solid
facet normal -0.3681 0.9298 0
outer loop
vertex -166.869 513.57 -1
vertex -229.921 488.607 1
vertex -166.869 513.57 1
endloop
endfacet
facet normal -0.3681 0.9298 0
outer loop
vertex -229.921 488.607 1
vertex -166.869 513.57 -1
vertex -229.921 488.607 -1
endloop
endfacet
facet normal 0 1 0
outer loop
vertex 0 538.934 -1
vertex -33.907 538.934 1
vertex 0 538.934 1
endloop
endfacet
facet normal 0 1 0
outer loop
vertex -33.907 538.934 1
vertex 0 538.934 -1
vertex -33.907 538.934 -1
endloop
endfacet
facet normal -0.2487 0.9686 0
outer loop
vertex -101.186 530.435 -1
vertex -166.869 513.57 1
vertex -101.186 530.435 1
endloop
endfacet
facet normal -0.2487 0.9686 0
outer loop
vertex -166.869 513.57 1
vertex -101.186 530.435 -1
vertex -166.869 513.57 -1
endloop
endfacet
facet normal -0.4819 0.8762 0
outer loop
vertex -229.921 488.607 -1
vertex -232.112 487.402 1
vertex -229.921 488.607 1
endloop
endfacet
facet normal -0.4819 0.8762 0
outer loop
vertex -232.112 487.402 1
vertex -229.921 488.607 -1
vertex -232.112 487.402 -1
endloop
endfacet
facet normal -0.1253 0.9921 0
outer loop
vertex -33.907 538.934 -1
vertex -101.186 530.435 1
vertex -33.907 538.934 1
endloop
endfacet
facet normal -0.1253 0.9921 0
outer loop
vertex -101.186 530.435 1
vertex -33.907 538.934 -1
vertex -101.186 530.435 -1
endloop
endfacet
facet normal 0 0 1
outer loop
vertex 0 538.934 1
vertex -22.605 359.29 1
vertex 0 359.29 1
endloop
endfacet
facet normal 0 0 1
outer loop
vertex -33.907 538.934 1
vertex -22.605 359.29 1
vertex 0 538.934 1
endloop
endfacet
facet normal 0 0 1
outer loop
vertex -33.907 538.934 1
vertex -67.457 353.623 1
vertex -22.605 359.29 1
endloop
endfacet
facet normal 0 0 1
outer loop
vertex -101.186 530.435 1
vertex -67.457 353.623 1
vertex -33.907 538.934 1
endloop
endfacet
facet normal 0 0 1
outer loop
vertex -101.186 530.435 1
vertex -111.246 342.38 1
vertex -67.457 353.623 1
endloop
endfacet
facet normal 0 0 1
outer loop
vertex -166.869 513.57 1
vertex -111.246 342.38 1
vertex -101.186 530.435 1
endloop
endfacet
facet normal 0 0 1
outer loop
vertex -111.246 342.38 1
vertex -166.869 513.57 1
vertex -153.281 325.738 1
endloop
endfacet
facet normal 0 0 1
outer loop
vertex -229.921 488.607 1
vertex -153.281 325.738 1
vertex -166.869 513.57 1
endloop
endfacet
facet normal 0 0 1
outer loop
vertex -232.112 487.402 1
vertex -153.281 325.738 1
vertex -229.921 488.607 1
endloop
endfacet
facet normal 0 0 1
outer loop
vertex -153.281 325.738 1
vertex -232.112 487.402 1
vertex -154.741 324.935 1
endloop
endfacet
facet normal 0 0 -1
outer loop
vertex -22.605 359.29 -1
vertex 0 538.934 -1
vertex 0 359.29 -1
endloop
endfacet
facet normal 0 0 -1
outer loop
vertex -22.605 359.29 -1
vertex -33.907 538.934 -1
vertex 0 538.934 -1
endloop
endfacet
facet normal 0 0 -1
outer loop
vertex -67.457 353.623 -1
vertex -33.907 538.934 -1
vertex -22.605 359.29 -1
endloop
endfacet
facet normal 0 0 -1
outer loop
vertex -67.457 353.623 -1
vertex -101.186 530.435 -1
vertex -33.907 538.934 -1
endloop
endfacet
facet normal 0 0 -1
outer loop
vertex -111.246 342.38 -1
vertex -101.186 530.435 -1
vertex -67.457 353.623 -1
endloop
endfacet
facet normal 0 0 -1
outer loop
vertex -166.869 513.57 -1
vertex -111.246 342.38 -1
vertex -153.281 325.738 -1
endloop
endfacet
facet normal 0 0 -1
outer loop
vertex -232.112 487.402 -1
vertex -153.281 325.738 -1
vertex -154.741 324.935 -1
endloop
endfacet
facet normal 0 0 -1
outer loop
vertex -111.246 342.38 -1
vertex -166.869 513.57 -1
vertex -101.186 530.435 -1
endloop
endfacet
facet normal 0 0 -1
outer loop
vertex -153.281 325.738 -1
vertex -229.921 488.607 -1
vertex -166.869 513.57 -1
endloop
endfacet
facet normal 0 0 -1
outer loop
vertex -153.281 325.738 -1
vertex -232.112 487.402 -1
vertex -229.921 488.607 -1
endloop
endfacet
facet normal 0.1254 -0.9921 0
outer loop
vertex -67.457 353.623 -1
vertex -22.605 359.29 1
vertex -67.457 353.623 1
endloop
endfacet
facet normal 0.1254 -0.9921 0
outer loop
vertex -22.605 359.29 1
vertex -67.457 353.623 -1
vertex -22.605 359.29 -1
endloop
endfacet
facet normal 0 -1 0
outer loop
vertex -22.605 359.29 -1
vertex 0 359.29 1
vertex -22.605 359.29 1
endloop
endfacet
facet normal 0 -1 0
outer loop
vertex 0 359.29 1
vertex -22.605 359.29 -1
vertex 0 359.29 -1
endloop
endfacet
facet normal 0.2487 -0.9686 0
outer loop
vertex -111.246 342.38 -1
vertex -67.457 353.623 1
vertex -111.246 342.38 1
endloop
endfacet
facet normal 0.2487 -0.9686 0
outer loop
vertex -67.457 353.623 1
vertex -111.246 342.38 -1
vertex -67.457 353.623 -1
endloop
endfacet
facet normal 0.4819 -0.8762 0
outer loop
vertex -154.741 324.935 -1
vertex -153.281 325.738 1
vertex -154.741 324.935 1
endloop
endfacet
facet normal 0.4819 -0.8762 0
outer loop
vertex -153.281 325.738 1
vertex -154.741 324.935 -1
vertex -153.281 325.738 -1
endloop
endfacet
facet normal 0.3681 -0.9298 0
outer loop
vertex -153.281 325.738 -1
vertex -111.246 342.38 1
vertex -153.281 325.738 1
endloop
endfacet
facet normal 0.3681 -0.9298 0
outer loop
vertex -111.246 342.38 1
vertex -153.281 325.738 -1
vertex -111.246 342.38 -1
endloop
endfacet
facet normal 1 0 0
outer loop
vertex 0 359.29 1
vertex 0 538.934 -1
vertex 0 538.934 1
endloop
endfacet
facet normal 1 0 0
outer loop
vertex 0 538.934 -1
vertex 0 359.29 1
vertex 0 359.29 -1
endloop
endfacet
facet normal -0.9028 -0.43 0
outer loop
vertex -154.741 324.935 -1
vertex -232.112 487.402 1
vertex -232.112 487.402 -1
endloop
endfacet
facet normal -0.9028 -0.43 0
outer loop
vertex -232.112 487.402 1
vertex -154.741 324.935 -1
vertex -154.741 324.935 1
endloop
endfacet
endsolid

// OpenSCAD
WristArc=160;
ElbowArc=260;
Length=180;


//hidden---------------
Wrist2orig=(WristArc*Length)/(ElbowArc-Length);
Elbow2orig=Wrist2orig+Length;
Angle=(WristArc/Wrist2orig)*(180/3.14159);

difference(){
union(){
difference(){
cylinder(r=Elbow2orig,h=2,center=true, $fn=50);
cylinder(r=Wrist2orig,h=3,center=true, $fn=50);
}
}
	
union(){
	translate([Elbow2orig,0,0])
		cube([Elbow2orig*2,Elbow2orig*2+5,4],center=true);


	rotate([0,0,Angle])
		translate([-Elbow2orig,0,0])
			cube([Elbow2orig*2,Elbow2orig*2+5,5],center=true);
}
}
